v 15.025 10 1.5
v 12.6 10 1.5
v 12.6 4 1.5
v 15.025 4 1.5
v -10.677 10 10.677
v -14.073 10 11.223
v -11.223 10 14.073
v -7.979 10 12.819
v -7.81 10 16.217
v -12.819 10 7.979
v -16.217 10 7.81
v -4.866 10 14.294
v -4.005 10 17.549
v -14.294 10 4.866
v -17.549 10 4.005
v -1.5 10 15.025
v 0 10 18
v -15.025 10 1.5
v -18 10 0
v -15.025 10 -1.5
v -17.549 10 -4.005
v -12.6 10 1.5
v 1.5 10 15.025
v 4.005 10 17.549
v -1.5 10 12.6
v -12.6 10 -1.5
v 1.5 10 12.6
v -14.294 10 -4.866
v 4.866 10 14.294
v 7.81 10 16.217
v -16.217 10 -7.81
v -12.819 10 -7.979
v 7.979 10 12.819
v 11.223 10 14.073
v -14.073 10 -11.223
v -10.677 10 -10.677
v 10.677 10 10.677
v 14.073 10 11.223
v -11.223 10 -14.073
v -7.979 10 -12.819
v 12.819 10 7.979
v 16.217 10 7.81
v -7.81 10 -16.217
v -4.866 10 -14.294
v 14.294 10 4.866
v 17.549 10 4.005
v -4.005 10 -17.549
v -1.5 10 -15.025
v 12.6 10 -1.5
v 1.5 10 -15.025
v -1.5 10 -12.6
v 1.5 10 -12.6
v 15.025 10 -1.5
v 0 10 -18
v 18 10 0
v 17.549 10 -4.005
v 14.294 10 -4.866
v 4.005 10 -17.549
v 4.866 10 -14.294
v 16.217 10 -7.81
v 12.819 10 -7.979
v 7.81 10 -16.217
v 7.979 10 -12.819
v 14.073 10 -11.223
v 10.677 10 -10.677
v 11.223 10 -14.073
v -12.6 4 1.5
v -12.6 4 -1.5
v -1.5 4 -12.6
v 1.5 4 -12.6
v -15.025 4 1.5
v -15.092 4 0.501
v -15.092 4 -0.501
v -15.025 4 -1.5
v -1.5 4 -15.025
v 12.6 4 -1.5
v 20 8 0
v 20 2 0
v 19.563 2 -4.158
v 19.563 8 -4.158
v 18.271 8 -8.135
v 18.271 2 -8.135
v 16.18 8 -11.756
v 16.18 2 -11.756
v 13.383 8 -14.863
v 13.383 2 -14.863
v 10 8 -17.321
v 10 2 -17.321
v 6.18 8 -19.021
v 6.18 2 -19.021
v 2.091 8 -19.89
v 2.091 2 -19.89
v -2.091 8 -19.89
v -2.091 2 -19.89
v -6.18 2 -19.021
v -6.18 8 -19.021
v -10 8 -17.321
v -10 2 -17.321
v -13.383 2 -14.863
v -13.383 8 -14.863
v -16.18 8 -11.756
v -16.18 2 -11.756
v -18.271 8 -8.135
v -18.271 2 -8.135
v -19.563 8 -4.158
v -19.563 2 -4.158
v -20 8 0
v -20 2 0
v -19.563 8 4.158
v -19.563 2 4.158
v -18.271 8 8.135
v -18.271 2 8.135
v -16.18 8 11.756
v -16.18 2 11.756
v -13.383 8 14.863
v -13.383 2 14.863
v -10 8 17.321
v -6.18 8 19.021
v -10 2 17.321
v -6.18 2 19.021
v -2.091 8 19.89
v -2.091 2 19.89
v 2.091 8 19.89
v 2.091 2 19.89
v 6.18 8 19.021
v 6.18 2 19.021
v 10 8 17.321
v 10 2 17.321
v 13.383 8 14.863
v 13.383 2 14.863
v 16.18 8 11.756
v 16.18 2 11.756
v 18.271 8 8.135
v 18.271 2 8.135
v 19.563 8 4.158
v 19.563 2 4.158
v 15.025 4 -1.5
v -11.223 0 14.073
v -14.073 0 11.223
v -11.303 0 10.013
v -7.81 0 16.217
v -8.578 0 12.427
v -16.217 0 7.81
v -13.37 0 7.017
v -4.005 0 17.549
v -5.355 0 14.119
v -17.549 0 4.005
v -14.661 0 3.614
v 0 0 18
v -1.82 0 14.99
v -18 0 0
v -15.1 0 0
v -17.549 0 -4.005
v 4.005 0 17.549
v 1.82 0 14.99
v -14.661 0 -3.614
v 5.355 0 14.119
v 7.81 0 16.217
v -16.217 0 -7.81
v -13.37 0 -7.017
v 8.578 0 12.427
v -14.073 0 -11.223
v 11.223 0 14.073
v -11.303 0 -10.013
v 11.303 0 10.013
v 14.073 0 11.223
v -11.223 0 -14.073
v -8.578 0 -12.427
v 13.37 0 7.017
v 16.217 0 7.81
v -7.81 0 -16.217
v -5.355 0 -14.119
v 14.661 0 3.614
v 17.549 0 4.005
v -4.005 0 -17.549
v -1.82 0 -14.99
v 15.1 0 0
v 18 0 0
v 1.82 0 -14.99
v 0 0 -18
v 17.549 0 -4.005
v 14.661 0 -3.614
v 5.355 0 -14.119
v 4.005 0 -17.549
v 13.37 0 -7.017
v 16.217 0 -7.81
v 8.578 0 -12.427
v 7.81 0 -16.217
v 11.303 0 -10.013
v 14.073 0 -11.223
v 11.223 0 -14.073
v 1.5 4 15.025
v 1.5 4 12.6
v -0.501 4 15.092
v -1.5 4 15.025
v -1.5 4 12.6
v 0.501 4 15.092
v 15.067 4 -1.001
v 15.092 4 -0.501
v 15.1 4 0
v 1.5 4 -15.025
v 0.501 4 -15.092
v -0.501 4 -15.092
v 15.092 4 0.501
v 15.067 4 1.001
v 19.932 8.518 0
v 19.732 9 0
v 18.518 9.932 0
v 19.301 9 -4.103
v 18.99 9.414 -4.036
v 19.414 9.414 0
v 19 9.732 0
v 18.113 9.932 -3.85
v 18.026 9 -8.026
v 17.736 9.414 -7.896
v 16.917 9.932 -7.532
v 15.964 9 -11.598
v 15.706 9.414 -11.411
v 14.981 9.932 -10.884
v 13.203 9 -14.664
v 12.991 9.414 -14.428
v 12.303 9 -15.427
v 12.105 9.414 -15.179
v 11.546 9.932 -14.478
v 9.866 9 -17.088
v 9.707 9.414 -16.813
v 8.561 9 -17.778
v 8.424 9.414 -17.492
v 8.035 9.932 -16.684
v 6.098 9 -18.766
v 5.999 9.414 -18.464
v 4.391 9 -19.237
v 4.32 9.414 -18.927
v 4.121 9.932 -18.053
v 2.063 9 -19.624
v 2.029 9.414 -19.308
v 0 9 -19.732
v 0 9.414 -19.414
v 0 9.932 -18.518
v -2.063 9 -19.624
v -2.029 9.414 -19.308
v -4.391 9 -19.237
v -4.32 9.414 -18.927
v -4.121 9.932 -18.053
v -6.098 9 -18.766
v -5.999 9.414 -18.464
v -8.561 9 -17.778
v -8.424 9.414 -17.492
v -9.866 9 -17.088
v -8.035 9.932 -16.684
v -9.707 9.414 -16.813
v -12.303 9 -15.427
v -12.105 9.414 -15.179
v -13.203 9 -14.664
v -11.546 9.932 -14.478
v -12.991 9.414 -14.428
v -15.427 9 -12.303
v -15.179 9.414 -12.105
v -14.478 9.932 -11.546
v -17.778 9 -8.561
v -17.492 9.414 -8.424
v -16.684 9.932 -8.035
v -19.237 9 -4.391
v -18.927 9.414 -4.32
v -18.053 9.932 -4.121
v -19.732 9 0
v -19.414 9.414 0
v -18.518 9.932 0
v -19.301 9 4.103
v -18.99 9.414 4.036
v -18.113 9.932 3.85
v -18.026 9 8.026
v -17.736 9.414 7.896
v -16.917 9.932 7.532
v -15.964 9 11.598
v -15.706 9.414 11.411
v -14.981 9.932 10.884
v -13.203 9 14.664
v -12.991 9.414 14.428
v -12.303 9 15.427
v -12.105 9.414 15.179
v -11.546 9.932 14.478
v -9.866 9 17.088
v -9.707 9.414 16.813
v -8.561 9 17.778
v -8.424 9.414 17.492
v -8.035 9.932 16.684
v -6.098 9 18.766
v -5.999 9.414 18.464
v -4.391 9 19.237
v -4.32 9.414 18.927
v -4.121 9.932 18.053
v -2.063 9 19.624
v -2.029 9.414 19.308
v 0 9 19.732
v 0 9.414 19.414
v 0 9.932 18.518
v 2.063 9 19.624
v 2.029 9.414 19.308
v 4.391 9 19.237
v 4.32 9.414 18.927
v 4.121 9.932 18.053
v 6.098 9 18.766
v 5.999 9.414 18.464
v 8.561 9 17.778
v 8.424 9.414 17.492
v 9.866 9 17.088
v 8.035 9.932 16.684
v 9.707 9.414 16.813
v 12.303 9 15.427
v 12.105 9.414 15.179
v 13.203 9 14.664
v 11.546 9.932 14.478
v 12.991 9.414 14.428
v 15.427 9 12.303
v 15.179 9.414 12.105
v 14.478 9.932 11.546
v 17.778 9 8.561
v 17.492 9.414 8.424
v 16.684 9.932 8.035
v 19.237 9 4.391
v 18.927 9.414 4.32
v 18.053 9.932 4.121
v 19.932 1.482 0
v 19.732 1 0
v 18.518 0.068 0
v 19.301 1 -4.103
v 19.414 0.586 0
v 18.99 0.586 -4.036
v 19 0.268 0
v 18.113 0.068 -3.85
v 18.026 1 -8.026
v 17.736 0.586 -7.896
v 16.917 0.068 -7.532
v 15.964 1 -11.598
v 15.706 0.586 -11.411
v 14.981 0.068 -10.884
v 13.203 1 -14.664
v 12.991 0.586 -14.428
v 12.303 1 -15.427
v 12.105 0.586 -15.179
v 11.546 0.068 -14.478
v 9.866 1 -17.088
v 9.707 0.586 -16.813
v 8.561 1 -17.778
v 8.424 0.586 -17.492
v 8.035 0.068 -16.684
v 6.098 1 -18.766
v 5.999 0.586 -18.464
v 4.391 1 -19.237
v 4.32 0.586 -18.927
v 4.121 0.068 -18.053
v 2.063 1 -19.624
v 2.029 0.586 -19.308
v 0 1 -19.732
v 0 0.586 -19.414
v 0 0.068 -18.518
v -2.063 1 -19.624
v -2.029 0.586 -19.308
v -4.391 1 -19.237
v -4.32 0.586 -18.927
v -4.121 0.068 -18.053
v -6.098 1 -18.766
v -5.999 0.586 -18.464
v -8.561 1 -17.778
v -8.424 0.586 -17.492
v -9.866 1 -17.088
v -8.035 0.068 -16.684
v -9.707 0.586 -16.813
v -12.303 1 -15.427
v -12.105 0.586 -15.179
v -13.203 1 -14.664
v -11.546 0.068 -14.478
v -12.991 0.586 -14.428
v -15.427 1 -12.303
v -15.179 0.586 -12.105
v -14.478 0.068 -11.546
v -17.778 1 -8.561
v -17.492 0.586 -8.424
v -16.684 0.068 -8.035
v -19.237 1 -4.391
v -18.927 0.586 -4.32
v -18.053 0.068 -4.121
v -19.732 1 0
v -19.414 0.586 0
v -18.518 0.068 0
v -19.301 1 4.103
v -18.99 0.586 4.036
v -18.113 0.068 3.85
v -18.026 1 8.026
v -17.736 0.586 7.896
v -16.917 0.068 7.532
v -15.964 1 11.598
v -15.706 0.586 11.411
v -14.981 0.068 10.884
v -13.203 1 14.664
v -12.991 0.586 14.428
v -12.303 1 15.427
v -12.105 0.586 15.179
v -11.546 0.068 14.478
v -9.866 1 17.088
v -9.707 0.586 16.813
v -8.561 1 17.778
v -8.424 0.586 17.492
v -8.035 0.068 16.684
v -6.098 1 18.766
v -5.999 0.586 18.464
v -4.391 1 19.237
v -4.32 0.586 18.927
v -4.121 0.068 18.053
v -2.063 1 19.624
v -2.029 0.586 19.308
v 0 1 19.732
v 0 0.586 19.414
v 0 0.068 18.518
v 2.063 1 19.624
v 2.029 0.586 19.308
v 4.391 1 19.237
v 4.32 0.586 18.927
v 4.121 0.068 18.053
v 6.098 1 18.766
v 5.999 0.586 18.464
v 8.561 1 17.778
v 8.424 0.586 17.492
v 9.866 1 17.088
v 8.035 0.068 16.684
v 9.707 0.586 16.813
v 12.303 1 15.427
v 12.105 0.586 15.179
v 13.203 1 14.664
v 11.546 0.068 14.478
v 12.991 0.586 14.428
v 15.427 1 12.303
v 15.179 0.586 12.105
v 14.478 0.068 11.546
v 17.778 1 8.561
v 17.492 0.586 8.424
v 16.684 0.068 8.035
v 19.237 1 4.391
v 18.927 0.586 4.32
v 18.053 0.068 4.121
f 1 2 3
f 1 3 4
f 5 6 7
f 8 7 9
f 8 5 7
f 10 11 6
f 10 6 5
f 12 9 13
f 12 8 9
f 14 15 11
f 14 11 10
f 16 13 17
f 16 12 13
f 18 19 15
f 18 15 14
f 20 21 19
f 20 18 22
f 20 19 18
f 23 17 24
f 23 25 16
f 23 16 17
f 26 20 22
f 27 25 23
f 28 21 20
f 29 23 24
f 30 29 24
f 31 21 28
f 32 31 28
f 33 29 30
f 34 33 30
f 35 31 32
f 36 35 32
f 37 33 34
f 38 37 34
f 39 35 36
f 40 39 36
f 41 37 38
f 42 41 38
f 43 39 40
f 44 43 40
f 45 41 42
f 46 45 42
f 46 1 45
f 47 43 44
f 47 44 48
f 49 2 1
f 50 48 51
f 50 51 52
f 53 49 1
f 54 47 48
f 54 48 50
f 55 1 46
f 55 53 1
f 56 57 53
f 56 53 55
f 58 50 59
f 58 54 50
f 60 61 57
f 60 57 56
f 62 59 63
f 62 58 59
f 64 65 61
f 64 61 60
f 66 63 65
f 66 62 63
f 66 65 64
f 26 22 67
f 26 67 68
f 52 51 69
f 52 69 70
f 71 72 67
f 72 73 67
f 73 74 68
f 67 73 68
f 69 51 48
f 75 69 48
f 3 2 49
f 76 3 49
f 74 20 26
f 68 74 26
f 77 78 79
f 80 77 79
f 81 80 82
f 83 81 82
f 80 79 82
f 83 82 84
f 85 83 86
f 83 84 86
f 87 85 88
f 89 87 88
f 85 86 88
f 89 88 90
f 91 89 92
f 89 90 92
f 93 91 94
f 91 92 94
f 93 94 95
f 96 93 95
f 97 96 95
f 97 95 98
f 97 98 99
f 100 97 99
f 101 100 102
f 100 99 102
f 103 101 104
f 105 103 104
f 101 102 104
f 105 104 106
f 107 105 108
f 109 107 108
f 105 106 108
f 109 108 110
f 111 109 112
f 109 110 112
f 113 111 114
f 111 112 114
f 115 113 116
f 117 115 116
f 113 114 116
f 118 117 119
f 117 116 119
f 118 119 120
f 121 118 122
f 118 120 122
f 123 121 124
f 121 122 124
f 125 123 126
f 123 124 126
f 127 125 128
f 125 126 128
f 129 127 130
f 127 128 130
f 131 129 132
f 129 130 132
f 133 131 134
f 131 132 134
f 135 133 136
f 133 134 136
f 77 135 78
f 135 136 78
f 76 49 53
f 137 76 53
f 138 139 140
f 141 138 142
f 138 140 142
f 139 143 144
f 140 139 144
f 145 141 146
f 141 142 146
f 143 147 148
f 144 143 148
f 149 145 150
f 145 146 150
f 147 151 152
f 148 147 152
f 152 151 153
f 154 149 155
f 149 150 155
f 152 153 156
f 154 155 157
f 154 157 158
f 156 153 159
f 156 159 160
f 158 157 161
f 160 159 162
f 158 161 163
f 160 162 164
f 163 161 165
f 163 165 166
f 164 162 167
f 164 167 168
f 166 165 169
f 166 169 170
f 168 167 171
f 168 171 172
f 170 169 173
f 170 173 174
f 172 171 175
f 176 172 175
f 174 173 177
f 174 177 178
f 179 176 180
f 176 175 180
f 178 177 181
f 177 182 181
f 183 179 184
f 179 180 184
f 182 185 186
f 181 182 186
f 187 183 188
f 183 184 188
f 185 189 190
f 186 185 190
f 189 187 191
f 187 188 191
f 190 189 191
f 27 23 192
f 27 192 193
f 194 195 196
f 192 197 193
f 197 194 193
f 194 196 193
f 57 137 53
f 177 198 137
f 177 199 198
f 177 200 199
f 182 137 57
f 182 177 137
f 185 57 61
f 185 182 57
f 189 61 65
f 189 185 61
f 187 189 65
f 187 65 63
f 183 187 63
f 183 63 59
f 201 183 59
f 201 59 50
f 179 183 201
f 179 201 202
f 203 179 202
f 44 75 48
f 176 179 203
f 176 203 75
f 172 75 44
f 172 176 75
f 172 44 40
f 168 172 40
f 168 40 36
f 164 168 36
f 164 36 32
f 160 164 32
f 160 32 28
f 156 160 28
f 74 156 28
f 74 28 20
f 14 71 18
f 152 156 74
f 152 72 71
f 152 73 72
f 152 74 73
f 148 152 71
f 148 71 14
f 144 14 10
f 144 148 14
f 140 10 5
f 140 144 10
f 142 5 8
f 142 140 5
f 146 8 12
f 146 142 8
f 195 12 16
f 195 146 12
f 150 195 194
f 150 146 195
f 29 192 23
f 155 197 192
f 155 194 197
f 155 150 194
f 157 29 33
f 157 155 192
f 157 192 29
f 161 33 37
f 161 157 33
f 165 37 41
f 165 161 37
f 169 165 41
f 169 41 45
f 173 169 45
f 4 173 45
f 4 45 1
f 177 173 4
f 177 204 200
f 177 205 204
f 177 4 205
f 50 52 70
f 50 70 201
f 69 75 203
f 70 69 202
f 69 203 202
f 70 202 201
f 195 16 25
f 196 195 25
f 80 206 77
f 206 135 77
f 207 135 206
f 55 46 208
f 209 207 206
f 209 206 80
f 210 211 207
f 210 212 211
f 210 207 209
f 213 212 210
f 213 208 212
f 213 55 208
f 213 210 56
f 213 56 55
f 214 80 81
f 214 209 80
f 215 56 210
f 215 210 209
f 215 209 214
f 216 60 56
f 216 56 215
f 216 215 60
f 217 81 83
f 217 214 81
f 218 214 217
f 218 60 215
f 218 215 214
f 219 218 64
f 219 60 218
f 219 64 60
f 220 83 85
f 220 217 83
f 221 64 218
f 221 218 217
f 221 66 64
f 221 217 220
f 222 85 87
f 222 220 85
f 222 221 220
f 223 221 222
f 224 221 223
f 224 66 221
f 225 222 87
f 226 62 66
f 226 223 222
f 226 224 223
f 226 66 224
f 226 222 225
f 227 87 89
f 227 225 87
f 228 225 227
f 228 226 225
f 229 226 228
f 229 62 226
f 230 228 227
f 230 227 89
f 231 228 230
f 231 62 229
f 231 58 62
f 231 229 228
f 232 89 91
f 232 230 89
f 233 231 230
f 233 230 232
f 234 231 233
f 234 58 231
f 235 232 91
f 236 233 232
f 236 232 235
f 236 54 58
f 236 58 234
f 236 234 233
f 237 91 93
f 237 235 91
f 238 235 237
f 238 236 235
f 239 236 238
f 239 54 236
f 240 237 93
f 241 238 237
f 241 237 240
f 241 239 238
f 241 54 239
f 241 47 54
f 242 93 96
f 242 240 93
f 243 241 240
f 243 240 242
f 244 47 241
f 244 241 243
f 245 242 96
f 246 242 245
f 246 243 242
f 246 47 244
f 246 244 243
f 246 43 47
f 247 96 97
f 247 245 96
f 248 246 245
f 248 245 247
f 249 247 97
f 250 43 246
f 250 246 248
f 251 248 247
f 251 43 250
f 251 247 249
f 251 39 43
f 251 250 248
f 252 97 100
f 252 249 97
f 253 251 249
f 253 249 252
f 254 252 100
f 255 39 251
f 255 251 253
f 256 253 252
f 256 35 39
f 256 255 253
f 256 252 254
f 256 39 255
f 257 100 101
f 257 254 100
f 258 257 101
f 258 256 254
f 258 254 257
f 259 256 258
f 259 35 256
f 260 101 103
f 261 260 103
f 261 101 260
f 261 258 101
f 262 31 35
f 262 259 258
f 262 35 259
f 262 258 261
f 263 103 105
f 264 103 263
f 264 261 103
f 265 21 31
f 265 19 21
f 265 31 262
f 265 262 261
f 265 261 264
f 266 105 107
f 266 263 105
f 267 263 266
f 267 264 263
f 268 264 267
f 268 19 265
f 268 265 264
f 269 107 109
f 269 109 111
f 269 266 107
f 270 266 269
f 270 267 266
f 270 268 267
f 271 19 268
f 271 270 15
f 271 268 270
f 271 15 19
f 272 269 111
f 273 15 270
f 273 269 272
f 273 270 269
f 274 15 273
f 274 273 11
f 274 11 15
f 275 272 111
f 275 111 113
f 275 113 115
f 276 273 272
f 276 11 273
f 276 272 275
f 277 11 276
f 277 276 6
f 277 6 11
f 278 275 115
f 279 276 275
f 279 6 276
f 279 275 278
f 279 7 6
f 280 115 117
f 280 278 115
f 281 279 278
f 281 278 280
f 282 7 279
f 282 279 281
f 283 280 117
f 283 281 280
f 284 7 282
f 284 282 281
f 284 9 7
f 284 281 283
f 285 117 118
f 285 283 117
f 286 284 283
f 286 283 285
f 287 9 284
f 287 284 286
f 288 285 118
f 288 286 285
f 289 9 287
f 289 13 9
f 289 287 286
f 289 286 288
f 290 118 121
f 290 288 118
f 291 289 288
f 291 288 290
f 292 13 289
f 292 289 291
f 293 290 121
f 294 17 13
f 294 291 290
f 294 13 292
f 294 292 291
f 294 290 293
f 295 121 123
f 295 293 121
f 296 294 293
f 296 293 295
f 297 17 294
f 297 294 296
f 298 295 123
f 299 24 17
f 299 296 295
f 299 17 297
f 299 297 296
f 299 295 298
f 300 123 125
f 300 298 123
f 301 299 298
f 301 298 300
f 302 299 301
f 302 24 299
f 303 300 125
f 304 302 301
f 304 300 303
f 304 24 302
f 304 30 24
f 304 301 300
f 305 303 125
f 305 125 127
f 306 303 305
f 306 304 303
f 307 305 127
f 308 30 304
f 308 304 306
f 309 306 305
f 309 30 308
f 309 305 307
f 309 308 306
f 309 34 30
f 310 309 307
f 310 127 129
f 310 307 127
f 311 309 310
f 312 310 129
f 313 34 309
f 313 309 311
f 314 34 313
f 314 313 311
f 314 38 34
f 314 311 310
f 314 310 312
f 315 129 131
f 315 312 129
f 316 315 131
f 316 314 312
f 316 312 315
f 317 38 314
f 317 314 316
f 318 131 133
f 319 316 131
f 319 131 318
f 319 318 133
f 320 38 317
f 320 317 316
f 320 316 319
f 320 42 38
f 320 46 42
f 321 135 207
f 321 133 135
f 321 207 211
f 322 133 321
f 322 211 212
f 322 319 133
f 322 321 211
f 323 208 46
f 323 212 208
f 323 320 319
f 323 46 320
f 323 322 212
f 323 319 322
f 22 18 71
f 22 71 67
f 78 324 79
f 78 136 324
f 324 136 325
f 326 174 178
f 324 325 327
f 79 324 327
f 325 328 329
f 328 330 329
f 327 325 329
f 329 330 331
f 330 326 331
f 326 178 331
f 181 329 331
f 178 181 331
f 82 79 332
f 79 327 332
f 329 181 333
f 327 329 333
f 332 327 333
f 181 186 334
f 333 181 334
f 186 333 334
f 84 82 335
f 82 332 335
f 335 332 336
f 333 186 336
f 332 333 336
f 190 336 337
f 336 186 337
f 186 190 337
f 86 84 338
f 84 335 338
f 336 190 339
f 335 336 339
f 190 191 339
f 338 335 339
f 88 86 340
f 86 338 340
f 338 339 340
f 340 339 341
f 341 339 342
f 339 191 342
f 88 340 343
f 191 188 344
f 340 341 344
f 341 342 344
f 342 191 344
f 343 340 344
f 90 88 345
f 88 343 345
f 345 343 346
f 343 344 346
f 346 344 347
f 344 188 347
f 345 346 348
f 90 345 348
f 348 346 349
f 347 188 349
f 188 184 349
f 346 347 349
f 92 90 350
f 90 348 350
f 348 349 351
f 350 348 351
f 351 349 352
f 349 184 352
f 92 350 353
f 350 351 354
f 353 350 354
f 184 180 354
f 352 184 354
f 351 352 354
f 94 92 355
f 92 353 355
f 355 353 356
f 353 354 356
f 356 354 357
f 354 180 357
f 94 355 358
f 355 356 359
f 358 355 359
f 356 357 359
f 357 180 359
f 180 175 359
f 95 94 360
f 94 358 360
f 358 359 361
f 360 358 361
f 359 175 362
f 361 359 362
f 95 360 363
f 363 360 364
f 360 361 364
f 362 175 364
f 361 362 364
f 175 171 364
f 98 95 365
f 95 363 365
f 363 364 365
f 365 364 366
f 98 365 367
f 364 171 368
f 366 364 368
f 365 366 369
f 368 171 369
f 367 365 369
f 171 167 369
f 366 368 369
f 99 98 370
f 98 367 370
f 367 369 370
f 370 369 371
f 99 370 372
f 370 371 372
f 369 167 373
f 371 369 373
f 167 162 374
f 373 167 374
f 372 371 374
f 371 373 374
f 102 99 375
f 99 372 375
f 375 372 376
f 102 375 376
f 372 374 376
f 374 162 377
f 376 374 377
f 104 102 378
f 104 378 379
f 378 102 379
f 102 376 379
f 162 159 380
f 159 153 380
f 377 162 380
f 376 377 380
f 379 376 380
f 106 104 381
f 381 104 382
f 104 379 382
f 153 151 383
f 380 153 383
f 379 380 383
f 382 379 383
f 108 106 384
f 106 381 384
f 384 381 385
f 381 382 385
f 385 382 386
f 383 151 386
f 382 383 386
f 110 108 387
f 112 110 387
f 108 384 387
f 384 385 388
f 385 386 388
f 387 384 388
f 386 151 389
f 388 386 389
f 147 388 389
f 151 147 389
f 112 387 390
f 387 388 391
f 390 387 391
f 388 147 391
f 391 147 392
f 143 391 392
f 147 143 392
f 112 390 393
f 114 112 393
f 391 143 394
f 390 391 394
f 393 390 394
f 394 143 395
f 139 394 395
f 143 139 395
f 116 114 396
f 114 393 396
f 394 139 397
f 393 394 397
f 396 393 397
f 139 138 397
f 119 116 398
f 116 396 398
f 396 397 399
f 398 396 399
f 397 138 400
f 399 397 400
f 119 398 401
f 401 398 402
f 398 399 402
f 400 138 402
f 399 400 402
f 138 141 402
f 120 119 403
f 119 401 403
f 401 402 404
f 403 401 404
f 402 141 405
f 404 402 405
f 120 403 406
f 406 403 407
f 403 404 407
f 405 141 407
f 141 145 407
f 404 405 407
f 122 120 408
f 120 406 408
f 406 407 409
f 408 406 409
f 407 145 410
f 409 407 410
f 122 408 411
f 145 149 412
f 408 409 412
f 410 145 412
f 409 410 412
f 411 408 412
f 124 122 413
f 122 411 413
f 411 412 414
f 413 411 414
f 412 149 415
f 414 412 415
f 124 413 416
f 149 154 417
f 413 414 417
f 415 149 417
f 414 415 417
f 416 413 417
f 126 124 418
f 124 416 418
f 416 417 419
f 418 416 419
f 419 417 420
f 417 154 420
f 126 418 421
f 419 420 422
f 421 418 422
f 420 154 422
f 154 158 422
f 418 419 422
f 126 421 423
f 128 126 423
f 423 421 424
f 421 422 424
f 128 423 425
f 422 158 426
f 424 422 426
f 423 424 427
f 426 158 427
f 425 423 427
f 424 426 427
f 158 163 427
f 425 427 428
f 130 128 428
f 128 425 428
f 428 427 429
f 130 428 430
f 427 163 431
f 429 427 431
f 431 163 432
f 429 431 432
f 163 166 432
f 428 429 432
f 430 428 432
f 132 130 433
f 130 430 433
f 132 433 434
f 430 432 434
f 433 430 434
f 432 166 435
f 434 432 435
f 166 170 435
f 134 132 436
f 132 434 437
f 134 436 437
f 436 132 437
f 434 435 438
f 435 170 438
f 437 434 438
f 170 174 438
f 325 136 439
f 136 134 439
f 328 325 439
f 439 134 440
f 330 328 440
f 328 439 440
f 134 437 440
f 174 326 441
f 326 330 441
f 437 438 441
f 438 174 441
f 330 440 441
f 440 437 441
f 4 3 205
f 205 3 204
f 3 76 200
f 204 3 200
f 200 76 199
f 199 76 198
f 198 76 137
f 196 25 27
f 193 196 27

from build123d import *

# Parameters (mm, degrees)
SKETCH_1_R      = 20
SKETCH_1_R_2    = 15.1
EXTRUDE_1_DEPTH = 10
FILLET_1_R      = 2
SKETCH_2_W      = 3
SKETCH_2_H      = 5
SKETCH_2_W_2    = 5
SKETCH_2_H_2    = 3
EXTRUDE_2_DEPTH = 6


with BuildPart() as part:
    # Эскиз1 → Бобышка-Вытянуть1 (new body)
    with BuildSketch(Plane(origin=(0, 0, 0), x_dir=(1, 0, 0), z_dir=(0, 1, 0))):
        Circle(SKETCH_1_R)
        Circle(SKETCH_1_R_2, mode=Mode.SUBTRACT)
    extrude(amount=EXTRUDE_1_DEPTH)

    # Скругление1
    fillet_1_edges = [part.edges().sort_by_distance(p)[0] for p in [
        (-20, 0, 0),
        (-20, 10, 0),
    ]]
    fillet(fillet_1_edges, radius=FILLET_1_R)

    # Эскиз2 → Бобышка-Вытянуть2 (add)
    with BuildSketch(Plane(origin=(0, 10, 0), x_dir=(1, 0, 0), z_dir=(0, 1, 0))):
        with Locations((0, 15.1)):
            Rectangle(SKETCH_2_W, SKETCH_2_H)
        with Locations((-15.1, 0)):
            Rectangle(SKETCH_2_W_2, SKETCH_2_H_2)
        with Locations((15.1, 0)):
            Rectangle(SKETCH_2_W_2, SKETCH_2_H_2)
        with Locations((0, -15.1)):
            Rectangle(SKETCH_2_W, SKETCH_2_H)
    extrude(amount=-EXTRUDE_2_DEPTH)


solid = part.part
